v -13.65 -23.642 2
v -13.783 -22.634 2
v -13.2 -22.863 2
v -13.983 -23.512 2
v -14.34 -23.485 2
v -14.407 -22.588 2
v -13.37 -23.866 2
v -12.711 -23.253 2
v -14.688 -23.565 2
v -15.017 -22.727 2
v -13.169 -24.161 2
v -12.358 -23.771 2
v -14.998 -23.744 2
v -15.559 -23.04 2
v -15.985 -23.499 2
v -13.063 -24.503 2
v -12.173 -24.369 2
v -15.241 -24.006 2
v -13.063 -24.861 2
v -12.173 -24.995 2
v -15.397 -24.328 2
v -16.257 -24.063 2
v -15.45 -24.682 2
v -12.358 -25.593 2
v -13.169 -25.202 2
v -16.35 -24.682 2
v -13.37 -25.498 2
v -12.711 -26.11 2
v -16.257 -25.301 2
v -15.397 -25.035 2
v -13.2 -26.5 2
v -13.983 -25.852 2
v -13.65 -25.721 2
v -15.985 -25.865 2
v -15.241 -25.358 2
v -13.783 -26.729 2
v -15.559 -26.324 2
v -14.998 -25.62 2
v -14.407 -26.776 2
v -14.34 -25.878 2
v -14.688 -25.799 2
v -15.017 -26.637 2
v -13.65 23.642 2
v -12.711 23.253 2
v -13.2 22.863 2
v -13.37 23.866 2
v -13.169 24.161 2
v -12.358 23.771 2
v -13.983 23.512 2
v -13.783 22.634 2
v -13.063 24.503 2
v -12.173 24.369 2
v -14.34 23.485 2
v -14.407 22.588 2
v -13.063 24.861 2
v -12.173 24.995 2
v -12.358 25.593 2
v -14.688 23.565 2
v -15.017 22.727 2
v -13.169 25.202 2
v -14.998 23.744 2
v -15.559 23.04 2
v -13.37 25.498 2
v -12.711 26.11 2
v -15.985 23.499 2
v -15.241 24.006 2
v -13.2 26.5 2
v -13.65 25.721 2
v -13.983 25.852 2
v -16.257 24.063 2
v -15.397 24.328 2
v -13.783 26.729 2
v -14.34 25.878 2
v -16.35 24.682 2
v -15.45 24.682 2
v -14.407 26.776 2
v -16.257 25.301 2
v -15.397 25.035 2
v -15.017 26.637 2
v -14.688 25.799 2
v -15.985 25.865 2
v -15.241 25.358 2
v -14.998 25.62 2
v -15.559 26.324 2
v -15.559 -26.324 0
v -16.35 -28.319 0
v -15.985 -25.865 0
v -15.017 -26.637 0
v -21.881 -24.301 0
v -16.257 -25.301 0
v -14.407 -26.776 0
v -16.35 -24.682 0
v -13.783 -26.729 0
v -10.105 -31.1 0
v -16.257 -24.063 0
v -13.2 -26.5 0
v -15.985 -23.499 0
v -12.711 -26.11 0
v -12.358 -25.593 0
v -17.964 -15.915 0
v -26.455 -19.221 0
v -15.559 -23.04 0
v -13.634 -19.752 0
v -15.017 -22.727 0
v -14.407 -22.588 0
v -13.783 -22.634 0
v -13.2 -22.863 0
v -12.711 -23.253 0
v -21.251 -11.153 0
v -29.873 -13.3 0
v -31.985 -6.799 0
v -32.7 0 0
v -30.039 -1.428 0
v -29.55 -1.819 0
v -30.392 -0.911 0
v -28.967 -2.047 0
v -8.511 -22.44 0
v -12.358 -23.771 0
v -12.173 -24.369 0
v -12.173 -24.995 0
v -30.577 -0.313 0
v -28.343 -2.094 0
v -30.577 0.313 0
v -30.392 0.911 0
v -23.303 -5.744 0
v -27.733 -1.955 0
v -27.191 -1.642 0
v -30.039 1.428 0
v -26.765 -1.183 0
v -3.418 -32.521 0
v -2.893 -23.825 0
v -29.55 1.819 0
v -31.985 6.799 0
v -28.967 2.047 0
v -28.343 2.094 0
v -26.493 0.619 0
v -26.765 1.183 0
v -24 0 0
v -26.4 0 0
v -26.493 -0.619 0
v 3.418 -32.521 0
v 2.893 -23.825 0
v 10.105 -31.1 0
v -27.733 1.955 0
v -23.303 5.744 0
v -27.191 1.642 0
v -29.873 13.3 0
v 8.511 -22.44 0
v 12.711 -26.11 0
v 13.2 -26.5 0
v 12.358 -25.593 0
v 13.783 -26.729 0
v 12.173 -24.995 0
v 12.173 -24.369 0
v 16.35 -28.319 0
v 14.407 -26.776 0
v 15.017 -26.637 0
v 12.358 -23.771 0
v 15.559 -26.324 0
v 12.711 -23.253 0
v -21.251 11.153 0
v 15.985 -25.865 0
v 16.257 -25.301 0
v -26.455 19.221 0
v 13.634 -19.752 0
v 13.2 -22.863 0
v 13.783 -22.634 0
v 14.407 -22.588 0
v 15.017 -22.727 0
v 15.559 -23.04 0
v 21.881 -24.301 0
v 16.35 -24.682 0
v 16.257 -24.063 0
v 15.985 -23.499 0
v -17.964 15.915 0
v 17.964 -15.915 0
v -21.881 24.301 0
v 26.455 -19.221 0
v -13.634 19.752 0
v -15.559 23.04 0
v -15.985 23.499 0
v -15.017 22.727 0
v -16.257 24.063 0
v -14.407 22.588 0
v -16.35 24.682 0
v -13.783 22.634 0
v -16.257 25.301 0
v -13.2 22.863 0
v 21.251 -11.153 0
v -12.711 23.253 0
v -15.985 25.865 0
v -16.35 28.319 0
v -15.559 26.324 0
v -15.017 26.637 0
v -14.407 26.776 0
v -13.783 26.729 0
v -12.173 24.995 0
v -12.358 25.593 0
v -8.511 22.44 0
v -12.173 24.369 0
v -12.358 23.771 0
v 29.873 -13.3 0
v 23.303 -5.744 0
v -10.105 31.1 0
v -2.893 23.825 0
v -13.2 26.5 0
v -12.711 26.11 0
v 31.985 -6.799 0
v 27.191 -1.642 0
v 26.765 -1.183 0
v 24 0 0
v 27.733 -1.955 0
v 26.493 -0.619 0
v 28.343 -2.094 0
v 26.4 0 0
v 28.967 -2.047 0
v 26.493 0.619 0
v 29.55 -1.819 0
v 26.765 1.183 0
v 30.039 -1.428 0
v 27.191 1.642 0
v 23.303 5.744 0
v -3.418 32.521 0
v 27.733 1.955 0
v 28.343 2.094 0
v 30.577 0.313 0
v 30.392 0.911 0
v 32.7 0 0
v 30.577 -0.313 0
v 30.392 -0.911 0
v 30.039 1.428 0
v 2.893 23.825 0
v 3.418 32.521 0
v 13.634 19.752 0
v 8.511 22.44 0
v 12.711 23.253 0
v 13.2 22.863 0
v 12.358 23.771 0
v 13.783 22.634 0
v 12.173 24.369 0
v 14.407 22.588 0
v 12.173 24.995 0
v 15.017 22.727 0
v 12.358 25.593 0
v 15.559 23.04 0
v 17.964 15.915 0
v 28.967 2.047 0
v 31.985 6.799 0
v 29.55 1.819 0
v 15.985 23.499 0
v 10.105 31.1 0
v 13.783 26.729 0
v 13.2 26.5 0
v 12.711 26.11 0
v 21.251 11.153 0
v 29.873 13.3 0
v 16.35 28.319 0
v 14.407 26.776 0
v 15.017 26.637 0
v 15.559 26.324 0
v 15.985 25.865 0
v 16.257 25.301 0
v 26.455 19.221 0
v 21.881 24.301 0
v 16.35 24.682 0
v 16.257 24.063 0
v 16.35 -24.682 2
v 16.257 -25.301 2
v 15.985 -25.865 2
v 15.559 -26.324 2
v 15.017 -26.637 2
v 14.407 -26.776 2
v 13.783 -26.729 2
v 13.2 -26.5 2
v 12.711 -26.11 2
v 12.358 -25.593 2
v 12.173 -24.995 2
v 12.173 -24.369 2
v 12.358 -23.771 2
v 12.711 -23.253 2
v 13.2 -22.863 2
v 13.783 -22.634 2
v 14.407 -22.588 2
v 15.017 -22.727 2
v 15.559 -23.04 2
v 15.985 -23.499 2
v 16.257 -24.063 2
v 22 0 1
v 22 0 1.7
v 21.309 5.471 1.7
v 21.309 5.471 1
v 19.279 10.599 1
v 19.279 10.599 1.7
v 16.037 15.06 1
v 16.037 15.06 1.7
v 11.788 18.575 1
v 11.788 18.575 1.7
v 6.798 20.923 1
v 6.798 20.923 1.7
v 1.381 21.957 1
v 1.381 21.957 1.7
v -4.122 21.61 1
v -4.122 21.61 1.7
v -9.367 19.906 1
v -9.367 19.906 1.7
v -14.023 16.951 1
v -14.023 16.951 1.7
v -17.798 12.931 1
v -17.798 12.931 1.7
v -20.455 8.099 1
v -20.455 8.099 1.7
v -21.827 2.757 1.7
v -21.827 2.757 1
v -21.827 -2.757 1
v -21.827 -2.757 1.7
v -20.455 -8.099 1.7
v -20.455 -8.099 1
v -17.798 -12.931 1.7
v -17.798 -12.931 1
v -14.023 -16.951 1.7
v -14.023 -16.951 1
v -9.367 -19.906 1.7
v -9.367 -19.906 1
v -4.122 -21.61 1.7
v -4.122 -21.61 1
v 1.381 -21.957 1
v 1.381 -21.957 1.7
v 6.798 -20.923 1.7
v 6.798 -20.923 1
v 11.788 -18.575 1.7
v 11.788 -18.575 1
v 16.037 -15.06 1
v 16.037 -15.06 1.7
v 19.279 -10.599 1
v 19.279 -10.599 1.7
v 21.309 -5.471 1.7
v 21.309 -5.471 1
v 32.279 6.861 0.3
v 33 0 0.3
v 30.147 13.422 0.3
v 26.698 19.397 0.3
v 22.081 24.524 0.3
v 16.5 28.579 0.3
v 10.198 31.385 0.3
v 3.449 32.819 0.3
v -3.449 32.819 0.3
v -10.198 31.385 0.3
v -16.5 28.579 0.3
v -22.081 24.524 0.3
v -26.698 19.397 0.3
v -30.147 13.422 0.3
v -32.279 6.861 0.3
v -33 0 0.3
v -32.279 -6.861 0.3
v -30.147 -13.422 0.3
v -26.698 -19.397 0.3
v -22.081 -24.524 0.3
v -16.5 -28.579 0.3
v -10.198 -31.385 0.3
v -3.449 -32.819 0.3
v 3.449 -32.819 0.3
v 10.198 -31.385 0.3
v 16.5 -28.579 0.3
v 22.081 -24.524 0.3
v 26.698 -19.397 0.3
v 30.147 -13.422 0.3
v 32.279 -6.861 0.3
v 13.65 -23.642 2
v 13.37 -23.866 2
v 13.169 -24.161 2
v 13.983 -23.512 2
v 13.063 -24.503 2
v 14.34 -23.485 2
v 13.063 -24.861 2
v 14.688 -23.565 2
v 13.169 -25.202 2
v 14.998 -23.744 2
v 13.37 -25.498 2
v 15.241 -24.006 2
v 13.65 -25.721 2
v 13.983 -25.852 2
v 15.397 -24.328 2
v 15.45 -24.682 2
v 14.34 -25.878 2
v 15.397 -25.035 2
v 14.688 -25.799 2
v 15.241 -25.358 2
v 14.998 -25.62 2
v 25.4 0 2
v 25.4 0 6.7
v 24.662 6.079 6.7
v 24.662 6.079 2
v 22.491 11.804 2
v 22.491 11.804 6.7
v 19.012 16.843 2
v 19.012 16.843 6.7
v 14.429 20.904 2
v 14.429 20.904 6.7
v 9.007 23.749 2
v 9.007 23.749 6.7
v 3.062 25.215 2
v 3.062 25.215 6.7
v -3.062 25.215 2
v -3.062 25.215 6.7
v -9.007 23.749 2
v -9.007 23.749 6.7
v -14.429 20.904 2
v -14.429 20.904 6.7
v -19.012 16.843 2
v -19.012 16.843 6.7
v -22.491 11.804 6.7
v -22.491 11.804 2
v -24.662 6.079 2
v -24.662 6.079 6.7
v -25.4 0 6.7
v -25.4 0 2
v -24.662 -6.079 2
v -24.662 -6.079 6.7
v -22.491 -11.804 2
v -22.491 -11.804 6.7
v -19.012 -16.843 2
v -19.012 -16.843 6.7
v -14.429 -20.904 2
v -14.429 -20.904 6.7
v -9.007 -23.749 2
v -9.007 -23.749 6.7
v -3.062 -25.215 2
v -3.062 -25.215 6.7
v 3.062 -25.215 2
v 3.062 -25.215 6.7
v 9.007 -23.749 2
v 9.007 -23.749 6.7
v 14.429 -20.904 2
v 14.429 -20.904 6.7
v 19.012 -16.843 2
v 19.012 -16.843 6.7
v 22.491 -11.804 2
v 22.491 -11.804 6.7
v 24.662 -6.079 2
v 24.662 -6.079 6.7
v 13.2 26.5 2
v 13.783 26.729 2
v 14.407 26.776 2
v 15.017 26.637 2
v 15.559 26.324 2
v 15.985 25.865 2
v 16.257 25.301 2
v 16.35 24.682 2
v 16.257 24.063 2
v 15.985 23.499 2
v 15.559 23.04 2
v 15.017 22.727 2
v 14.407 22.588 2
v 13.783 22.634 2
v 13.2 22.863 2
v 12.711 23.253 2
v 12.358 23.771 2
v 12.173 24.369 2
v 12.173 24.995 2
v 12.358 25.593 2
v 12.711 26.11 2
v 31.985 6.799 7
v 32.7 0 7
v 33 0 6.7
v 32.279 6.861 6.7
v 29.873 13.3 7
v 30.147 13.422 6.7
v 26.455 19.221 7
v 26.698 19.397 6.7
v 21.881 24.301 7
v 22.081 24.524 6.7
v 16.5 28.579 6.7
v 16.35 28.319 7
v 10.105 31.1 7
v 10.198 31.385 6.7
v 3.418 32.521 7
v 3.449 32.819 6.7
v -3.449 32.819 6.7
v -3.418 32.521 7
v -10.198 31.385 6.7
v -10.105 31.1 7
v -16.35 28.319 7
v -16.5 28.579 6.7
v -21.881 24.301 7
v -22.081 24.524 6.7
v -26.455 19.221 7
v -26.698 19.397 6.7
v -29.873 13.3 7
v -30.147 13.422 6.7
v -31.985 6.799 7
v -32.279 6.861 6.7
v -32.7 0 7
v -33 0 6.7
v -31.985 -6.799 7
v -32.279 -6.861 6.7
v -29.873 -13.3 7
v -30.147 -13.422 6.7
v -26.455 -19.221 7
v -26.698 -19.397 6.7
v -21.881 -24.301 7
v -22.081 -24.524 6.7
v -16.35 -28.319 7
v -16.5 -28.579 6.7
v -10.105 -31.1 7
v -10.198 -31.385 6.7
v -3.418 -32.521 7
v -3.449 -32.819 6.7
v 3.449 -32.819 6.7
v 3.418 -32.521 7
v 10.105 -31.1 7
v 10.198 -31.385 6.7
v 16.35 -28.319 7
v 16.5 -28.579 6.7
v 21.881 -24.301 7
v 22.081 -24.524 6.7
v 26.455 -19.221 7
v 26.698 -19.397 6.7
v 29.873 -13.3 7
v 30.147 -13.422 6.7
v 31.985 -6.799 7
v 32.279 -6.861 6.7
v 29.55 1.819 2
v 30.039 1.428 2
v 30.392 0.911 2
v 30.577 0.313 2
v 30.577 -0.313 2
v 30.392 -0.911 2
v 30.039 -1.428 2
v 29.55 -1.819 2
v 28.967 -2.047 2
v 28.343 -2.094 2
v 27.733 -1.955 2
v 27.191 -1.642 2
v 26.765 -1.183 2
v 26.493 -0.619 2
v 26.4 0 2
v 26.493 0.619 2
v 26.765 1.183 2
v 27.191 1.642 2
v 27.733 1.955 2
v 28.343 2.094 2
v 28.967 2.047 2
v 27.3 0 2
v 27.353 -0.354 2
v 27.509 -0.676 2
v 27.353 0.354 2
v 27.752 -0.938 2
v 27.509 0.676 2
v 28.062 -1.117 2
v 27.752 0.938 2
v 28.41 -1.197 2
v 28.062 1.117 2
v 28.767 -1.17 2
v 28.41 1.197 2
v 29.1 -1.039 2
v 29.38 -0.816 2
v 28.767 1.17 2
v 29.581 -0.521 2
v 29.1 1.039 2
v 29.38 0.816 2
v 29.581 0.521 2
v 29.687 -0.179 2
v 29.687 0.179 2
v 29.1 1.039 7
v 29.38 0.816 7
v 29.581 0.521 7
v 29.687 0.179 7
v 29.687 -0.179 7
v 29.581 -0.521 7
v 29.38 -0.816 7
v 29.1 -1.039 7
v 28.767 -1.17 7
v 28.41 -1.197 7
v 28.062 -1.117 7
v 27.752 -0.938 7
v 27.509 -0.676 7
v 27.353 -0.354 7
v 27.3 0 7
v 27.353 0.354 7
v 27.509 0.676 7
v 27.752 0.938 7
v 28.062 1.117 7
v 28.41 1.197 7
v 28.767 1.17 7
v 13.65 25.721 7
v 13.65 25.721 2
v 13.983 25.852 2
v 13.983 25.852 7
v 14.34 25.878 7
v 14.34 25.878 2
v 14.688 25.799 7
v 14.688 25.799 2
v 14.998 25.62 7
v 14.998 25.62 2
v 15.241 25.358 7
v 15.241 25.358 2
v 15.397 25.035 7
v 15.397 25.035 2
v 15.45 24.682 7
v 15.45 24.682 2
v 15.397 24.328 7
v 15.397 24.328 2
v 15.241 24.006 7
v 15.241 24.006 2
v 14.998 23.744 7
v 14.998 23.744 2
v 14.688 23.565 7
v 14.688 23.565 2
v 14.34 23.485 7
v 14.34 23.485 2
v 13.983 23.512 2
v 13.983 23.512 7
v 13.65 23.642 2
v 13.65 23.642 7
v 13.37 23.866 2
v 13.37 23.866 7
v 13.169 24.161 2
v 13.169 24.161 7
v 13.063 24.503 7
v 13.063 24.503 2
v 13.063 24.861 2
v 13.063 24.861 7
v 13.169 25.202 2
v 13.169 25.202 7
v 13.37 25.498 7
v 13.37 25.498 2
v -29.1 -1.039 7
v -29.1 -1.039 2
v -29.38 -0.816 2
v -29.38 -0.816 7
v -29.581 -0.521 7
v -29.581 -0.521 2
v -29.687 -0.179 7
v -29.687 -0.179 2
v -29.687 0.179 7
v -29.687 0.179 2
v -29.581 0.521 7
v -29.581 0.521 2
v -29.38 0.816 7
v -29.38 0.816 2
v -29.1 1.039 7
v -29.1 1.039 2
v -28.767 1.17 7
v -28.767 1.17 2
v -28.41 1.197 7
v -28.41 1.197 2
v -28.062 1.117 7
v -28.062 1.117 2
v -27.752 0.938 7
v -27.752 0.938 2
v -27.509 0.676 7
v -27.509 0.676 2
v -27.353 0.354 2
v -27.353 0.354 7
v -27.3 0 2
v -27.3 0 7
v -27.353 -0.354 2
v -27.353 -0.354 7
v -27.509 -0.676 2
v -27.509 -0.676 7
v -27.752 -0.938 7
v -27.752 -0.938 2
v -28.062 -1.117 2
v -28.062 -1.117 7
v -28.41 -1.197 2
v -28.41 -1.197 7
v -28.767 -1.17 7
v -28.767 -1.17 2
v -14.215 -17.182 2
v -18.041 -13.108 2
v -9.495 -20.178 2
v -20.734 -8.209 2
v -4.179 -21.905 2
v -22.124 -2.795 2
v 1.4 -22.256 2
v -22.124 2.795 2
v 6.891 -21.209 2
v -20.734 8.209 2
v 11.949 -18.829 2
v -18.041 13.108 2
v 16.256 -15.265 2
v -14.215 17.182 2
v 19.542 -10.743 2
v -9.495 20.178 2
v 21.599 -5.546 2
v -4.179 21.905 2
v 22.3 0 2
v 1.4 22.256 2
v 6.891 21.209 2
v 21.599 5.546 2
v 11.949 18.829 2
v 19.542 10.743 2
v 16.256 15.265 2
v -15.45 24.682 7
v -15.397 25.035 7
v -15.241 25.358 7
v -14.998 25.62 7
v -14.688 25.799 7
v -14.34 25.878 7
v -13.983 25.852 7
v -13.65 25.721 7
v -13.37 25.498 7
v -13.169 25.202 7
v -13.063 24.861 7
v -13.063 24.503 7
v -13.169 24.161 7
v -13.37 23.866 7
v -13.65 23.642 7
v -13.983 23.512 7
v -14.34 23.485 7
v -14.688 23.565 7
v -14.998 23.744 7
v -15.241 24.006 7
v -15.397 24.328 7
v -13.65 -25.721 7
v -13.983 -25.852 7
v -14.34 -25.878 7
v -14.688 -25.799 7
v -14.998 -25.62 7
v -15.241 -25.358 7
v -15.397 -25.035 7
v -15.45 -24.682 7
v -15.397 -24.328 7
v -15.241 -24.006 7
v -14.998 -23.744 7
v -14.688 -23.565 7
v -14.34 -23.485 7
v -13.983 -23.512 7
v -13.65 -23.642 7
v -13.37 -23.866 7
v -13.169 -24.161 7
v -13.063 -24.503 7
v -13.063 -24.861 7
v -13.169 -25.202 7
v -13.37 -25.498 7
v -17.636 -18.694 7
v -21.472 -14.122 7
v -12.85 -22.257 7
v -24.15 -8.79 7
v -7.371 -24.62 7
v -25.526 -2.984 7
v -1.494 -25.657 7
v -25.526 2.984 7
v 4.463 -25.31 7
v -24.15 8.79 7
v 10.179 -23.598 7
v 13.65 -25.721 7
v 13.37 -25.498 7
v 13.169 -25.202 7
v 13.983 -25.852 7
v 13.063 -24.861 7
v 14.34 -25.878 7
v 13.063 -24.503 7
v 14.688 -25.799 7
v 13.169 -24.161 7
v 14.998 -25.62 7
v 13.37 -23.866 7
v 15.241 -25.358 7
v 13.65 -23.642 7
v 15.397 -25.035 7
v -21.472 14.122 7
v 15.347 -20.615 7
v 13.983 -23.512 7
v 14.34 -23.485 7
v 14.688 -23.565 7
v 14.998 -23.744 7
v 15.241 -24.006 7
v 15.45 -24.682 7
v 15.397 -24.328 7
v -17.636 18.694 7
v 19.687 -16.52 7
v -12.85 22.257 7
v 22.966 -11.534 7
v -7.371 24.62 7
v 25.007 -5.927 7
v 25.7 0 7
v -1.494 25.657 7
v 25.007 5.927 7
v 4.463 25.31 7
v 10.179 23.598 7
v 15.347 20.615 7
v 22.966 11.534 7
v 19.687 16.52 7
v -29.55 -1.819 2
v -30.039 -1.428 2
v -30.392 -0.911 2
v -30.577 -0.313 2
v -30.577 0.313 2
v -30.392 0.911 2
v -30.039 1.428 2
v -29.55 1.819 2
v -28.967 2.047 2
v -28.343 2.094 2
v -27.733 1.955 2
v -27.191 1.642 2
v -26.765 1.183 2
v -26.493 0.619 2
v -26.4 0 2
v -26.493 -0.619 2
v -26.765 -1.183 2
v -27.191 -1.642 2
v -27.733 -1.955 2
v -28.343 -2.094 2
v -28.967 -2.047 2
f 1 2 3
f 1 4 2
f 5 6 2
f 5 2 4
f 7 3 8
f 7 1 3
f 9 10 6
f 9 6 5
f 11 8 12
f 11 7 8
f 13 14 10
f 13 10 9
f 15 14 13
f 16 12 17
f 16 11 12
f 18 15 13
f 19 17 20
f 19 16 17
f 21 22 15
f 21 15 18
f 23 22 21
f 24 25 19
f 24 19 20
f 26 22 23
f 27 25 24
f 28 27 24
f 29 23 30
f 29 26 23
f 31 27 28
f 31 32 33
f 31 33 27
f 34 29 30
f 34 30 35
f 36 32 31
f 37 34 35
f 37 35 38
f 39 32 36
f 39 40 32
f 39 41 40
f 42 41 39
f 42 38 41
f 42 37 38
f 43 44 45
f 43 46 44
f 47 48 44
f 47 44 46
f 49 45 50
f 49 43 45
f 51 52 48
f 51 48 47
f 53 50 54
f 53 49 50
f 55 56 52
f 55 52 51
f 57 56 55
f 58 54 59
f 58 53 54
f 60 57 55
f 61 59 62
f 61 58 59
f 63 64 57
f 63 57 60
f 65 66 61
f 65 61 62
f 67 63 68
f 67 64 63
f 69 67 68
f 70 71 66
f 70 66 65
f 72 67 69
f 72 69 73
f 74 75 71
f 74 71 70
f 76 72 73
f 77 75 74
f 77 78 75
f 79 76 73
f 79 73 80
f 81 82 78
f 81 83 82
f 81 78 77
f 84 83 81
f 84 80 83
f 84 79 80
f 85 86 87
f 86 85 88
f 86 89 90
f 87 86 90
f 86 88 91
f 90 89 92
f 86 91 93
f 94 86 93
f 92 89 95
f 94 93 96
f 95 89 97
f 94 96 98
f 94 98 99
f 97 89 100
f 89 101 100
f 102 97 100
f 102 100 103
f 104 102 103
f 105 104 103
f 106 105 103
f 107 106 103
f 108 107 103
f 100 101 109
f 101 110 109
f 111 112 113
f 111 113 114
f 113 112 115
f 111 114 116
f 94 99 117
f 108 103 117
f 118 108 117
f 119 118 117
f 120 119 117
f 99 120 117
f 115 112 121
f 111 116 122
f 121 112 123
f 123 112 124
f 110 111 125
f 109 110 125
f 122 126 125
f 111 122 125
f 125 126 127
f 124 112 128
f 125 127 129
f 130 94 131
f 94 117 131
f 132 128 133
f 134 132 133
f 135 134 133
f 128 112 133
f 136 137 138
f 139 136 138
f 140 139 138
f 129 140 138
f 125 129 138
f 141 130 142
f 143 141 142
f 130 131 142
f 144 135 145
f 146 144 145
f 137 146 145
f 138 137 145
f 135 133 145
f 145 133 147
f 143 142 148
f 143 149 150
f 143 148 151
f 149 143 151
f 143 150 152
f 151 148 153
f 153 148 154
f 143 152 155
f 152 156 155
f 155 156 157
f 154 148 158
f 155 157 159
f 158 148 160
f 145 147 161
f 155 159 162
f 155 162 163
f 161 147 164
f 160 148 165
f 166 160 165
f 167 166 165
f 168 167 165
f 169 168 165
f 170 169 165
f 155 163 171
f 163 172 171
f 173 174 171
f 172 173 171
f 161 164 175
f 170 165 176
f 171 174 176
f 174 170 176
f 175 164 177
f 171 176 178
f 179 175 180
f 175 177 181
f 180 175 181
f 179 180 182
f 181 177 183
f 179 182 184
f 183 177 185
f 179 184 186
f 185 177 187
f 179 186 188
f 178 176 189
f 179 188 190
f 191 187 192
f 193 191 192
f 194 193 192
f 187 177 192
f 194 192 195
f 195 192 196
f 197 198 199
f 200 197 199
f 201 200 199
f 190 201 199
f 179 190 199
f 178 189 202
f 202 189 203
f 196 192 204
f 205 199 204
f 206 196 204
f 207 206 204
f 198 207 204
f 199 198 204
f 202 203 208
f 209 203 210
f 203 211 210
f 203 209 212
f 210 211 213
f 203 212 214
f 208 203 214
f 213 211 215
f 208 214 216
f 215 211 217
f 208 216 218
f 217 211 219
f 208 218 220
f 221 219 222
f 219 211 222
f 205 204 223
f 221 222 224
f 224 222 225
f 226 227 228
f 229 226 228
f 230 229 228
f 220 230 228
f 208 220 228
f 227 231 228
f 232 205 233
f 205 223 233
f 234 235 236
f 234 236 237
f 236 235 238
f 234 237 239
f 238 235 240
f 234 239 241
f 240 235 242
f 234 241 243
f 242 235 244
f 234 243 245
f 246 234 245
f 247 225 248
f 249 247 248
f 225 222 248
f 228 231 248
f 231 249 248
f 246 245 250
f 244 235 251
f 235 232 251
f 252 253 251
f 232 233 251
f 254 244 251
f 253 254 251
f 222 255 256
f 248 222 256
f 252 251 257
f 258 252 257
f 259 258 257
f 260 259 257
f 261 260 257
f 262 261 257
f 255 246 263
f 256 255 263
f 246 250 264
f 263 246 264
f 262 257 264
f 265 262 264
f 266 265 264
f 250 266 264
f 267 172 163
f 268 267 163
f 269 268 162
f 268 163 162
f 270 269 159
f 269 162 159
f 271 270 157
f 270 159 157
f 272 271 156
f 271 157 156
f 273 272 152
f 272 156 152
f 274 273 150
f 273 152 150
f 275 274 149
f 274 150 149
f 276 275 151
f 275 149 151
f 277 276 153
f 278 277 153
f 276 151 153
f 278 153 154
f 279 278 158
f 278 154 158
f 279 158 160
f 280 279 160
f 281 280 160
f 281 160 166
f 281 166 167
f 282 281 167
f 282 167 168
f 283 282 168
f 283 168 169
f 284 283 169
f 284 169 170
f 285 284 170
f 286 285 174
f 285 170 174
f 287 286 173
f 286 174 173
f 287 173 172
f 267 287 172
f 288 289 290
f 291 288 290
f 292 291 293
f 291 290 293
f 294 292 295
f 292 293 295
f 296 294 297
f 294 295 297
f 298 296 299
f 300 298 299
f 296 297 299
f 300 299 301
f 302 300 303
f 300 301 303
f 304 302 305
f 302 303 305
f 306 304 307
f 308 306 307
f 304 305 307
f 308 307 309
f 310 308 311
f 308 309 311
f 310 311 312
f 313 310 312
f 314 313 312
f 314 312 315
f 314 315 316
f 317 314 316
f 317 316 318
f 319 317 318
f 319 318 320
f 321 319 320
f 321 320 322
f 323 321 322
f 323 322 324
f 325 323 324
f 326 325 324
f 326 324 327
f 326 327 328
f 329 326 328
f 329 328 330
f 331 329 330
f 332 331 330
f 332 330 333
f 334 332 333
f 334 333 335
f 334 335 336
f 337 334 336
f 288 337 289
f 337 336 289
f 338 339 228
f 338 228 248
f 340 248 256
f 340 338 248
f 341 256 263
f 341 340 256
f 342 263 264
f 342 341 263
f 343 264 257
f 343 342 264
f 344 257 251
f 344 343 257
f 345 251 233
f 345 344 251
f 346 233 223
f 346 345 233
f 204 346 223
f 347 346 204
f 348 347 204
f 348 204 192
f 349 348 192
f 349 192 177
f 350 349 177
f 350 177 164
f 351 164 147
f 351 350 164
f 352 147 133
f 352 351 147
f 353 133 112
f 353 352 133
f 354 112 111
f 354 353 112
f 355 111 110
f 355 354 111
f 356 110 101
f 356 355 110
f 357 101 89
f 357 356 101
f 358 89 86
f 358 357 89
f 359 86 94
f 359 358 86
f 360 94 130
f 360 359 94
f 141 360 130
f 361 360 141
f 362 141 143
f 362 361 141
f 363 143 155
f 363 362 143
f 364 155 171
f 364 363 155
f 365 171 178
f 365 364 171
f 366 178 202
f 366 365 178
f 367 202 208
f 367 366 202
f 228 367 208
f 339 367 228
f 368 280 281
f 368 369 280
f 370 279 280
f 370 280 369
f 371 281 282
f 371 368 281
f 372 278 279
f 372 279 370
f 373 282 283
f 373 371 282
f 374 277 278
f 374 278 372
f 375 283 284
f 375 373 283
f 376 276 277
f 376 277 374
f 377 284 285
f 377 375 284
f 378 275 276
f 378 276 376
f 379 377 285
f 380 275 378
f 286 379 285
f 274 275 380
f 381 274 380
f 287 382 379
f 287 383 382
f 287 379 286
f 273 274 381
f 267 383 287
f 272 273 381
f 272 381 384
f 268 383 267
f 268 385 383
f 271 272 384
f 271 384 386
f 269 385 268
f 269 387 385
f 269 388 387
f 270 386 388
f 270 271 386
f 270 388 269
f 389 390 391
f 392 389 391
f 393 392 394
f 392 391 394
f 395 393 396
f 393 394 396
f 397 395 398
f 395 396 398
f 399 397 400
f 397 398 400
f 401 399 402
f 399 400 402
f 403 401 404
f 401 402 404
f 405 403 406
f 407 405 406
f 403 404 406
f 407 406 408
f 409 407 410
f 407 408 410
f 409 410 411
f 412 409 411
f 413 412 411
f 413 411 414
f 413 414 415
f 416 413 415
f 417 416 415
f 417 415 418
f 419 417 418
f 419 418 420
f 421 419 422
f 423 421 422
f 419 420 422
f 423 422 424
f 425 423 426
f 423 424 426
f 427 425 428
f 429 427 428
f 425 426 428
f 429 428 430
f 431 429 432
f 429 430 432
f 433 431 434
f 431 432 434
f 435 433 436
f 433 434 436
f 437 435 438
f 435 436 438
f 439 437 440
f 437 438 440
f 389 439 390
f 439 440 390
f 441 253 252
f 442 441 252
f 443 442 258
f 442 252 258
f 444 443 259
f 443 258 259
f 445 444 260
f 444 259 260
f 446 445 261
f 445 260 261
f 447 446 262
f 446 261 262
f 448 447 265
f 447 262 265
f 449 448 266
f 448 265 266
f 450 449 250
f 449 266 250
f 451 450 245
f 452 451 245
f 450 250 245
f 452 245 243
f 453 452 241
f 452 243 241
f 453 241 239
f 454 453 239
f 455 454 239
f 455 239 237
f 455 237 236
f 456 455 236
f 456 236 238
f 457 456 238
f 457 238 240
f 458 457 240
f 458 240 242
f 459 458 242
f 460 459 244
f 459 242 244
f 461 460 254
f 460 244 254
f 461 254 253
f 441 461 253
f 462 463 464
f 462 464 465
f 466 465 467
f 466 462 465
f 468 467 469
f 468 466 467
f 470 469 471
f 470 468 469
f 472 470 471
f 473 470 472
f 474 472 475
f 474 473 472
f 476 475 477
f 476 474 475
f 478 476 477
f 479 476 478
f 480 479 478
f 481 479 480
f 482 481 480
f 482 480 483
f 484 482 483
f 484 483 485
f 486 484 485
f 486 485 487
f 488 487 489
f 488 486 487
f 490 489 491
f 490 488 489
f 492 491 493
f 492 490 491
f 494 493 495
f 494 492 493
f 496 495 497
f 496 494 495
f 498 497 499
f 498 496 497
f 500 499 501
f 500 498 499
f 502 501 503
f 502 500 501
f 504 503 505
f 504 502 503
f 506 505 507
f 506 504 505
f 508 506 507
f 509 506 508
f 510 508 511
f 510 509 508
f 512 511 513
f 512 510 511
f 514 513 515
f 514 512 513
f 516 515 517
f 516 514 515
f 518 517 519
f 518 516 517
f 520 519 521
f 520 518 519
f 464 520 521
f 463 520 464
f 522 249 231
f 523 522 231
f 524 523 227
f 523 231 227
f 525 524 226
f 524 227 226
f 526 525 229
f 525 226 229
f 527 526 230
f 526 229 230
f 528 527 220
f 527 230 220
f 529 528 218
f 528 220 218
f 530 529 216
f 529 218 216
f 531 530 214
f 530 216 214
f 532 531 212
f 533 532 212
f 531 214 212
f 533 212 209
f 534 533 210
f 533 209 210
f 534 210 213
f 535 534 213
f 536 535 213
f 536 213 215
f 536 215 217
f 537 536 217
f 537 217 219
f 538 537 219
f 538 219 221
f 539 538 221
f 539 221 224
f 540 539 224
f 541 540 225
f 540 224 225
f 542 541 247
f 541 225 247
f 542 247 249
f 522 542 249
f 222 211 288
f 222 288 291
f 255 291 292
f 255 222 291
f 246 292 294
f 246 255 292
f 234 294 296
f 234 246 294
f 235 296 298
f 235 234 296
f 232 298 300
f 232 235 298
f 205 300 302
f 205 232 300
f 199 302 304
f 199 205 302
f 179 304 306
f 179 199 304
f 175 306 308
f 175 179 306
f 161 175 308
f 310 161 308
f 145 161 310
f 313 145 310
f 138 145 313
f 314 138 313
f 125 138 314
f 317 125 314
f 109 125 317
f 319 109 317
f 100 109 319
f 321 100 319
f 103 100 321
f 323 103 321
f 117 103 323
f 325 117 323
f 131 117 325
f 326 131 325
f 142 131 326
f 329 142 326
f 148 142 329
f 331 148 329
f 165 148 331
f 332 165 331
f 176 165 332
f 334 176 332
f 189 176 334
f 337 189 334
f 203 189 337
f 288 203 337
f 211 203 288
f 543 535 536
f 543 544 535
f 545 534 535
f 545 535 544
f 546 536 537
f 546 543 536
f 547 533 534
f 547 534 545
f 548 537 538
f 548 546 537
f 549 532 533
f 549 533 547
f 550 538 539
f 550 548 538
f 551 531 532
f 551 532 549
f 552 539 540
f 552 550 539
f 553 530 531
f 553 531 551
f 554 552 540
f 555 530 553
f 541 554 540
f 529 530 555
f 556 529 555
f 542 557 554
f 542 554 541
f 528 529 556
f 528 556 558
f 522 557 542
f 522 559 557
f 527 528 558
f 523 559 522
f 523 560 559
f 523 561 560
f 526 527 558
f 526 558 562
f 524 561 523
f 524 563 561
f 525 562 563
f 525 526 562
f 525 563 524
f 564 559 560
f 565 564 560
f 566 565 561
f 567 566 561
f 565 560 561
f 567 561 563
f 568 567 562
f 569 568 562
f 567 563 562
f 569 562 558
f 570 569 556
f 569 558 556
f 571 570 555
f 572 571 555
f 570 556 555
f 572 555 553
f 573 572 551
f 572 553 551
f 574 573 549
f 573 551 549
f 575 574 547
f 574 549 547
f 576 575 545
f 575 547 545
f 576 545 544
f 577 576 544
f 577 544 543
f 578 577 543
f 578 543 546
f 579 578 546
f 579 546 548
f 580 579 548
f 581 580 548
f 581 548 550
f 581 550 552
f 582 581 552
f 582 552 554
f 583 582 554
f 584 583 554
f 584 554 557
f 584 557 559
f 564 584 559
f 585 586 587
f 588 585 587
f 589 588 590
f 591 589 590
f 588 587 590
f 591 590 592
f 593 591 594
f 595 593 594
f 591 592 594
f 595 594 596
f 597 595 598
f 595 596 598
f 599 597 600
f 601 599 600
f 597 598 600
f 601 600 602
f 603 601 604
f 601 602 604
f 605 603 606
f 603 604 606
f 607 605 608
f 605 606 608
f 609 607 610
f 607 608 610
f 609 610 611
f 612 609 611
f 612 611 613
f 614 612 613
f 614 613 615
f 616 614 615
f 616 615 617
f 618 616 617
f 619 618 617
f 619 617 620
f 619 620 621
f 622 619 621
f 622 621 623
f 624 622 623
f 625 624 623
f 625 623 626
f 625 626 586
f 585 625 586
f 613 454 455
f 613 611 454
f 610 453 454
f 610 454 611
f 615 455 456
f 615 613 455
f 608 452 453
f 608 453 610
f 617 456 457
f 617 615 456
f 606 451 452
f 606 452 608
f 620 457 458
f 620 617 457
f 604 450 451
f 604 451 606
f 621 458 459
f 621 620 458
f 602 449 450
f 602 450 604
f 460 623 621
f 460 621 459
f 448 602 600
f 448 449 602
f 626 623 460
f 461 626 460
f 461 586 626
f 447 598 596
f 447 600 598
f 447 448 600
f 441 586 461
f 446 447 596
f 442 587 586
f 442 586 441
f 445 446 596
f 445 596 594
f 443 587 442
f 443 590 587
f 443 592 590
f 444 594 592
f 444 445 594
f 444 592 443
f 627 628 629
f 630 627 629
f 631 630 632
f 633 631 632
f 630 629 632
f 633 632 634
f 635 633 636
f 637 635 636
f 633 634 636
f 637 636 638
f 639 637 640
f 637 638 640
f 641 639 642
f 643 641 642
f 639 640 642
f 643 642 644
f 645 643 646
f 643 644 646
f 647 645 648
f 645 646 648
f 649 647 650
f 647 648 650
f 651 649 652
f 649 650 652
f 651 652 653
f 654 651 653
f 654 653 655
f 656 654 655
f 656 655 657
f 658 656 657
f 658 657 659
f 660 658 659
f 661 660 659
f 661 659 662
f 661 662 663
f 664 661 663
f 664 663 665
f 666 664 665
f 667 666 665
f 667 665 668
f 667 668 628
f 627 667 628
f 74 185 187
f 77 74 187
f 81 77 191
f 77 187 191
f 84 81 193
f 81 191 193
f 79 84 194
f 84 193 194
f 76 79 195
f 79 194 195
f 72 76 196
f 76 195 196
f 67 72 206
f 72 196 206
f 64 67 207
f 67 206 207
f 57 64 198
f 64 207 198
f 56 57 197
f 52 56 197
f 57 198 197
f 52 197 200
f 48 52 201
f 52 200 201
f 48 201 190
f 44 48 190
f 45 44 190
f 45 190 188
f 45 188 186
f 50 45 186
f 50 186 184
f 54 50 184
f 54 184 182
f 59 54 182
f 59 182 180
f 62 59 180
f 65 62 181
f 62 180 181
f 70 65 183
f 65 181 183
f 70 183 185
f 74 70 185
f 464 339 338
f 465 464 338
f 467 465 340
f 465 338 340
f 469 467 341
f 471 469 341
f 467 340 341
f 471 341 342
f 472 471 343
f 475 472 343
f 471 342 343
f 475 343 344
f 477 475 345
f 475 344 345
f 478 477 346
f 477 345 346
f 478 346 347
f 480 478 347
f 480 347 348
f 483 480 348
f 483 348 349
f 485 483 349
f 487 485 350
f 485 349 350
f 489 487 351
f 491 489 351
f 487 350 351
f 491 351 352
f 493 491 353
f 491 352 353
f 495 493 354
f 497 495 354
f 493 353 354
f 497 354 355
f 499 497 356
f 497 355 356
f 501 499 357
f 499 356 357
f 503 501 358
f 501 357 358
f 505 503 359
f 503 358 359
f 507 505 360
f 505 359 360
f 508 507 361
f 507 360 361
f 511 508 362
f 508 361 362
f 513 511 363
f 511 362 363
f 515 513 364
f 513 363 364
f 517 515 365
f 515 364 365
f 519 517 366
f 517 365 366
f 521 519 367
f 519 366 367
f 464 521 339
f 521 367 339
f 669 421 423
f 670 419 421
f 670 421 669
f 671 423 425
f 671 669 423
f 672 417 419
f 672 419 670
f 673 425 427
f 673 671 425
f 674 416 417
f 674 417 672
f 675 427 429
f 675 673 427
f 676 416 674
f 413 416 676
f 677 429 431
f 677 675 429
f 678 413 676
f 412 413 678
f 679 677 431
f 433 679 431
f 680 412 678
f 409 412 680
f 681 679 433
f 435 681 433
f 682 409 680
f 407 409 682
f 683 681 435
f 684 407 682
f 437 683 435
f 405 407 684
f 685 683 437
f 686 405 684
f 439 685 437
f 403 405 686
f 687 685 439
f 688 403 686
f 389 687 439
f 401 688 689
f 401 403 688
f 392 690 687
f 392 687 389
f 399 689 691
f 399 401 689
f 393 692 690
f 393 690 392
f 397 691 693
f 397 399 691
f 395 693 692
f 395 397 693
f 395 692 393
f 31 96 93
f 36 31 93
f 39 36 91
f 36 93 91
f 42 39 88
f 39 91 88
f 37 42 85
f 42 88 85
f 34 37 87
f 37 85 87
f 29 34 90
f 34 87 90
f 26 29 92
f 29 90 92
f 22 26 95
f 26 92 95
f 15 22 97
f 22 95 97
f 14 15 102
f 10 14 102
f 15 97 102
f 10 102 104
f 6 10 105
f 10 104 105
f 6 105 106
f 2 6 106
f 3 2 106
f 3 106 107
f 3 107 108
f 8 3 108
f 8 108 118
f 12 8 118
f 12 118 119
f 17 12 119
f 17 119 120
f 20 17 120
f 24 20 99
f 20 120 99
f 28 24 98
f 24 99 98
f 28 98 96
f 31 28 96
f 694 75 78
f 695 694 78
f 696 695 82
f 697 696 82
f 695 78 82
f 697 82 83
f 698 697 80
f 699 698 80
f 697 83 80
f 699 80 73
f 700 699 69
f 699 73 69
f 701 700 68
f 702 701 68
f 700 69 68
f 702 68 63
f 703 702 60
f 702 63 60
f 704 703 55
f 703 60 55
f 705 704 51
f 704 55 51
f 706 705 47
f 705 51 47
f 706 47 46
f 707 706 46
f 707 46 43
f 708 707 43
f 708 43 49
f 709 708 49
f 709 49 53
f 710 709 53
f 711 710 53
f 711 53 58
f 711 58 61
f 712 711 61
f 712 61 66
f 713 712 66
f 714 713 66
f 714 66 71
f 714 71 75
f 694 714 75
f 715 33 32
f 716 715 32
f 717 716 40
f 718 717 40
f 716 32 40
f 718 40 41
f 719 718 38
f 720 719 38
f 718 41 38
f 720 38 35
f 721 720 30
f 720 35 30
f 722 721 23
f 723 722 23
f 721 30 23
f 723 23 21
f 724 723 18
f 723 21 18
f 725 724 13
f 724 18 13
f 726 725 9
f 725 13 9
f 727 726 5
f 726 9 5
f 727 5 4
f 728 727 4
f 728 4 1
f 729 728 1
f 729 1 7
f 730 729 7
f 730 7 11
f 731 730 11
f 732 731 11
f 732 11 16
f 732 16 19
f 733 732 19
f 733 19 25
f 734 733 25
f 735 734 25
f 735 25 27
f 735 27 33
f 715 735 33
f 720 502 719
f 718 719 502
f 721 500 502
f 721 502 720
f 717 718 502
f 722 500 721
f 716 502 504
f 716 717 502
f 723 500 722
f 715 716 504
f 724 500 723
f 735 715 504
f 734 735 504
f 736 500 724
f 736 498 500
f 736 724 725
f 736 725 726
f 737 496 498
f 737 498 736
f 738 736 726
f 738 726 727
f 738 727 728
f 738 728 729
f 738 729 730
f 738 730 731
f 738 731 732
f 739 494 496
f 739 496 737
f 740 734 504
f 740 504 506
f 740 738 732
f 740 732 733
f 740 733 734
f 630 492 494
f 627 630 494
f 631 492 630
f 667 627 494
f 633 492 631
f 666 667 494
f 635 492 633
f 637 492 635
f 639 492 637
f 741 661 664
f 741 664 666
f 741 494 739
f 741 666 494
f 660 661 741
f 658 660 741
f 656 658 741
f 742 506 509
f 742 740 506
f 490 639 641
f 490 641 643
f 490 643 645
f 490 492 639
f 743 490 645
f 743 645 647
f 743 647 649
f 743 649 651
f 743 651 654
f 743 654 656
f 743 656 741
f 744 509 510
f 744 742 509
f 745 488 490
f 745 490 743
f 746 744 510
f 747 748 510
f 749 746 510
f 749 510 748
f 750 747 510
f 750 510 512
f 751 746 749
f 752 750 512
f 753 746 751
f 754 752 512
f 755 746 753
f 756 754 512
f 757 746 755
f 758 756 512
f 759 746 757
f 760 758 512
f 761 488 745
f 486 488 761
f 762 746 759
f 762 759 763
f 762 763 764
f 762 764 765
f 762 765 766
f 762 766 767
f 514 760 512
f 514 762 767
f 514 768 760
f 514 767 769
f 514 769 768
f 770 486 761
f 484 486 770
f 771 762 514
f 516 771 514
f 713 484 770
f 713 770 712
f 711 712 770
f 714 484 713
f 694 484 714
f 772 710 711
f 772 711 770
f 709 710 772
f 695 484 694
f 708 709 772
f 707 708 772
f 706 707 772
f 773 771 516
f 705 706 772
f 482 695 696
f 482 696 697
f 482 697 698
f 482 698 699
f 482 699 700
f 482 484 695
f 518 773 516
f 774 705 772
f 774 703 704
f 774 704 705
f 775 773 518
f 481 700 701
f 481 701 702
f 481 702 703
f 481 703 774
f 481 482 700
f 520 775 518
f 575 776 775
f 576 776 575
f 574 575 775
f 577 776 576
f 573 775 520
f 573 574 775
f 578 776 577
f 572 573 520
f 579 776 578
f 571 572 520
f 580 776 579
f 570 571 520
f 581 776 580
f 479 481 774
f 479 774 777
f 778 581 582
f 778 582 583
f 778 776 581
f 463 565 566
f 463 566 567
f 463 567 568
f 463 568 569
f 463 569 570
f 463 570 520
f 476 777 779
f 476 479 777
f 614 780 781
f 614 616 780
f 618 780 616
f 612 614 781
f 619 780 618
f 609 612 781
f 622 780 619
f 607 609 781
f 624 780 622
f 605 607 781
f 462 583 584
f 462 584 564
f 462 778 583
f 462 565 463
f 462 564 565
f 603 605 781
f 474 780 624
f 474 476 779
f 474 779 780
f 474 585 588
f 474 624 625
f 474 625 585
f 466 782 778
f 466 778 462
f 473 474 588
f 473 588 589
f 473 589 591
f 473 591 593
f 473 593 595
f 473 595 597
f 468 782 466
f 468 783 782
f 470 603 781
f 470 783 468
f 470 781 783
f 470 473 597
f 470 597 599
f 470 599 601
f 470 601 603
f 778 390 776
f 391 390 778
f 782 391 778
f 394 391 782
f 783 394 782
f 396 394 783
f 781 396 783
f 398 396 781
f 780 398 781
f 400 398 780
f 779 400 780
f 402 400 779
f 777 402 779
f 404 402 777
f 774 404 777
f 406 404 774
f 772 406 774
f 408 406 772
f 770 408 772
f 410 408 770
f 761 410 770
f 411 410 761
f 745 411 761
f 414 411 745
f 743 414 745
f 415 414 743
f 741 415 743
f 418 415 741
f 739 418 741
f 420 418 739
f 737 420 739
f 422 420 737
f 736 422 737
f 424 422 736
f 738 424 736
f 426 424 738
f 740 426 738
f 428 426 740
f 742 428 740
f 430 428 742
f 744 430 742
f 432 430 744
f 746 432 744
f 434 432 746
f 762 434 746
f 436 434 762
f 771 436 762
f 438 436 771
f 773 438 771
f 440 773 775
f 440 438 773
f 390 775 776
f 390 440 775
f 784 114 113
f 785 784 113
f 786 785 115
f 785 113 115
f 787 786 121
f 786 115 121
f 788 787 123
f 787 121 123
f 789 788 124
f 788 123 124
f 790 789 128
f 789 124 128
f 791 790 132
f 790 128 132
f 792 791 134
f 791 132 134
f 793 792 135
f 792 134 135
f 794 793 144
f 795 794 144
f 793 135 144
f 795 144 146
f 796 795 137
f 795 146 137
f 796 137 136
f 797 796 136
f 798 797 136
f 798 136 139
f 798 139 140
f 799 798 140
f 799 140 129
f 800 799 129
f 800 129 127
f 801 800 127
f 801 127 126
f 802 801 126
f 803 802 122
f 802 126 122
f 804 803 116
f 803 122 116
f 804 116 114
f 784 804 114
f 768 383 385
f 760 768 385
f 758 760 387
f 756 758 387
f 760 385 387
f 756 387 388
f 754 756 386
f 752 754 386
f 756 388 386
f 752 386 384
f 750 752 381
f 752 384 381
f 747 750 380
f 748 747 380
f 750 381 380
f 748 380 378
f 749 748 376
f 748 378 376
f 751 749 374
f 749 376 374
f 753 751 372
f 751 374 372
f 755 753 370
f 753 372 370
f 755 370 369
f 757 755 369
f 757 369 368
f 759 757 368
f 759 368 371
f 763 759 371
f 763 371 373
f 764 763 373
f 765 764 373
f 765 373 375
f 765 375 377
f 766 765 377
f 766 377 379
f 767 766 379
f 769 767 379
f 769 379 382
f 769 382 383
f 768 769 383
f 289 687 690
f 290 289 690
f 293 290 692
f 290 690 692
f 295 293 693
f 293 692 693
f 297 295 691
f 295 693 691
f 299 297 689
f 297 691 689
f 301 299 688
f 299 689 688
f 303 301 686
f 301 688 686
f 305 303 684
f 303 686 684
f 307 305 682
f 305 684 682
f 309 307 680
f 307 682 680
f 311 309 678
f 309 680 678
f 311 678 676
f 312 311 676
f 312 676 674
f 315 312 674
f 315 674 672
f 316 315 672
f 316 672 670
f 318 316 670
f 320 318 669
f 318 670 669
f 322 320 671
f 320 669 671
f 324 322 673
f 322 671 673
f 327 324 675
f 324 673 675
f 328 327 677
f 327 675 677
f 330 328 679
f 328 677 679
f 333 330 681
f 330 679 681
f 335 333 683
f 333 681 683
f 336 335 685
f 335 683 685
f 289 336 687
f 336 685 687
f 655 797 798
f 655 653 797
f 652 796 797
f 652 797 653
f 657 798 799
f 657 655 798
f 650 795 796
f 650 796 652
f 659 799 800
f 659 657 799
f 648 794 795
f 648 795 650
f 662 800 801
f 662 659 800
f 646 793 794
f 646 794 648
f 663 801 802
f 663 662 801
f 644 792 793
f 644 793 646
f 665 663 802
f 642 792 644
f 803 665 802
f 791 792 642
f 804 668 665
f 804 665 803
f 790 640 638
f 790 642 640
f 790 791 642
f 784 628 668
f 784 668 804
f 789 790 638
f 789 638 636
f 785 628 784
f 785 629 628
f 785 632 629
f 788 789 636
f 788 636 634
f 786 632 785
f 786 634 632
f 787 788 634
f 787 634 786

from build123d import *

# Parameters (mm, degrees)
SKETCH1_R                    = 33
MAIN_BODY_DEPTH              = 7
SKETCH2_R                    = 22
OPTICAL_CUTOUT_DEPTH         = 48.191100856
SKETCH3_R                    = 25.4
WINDOW_CUTOUT_DEPTH          = 5
SKETCH4_R                    = 1.2
CUT_EXTRUDE3_DEPTH           = 48.191100856
SKETCH5_R                    = 2.1
CUT_EXTRUDE4_DEPTH           = 2
CIRCULAR_PATTERN_COUNT       = 6
BUBBLE_CONTROL_CHAMFER_SIZE  = 1
BUBBLE_CONTROL_CHAMFER_SIZE2 = 2
CHAMFER1_SIZE                = 0.3


with BuildPart() as part:
    # Sketch1 → Main Body (new body)
    with BuildSketch(Plane.XY):
        Circle(SKETCH1_R)
    extrude(amount=MAIN_BODY_DEPTH)

    # Sketch2 → Optical Cutout (cut, through all)
    with BuildSketch(Plane.XY.offset(7)):
        Circle(SKETCH2_R)
    extrude(amount=-OPTICAL_CUTOUT_DEPTH, mode=Mode.SUBTRACT)

    # Sketch3 → Window Cutout (cut)
    with BuildSketch(Plane.XY.offset(7)):
        Circle(SKETCH3_R)
    extrude(amount=-WINDOW_CUTOUT_DEPTH, mode=Mode.SUBTRACT)

    # Sketch4 → Cut-Extrude3 (cut, through all)
    with BuildSketch(Plane(origin=(0, 0, 0), x_dir=(-1, 0, 0), z_dir=(0, 0, -1))):
        with Locations((14.25, 24.681724008)):
            Circle(SKETCH4_R)
    cut_extrude3 = extrude(amount=-CUT_EXTRUDE3_DEPTH, mode=Mode.SUBTRACT)

    # Sketch5 → Cut-Extrude4 (cut)
    with BuildSketch(Plane(origin=(0, 0, 0), x_dir=(-1, 0, 0), z_dir=(0, 0, -1))):
        with Locations((14.25, 24.681724008)):
            Circle(SKETCH5_R)
    cut_extrude4 = extrude(amount=-CUT_EXTRUDE4_DEPTH, mode=Mode.SUBTRACT)

    # Circular Pattern: Cut-Extrude3, Cut-Extrude4 ×6 about axis
    circular_pattern_axis = Axis((0, 0, 7), (0, 0, -1))
    add([cut_extrude3.rotate(circular_pattern_axis, i * 360 / CIRCULAR_PATTERN_COUNT) for i in range(1, CIRCULAR_PATTERN_COUNT)], mode=Mode.SUBTRACT)
    add([cut_extrude4.rotate(circular_pattern_axis, i * 360 / CIRCULAR_PATTERN_COUNT) for i in range(1, CIRCULAR_PATTERN_COUNT)], mode=Mode.SUBTRACT)

    # Bubble Control Chamfer
    bubble_control_chamfer_edges = [part.edges().sort_by_distance(p)[0] for p in [
        (-22, 0, 0),
    ]]
    bubble_control_chamfer_side = [part.faces().sort_by_distance(p)[0] for p in [
        (-22, 0, 1),
    ]]
    chamfer(bubble_control_chamfer_edges, length=BUBBLE_CONTROL_CHAMFER_SIZE, length2=BUBBLE_CONTROL_CHAMFER_SIZE2, reference=bubble_control_chamfer_side[0])

    # Chamfer1
    chamfer1_edges = [part.edges().sort_by_distance(p)[0] for p in [
        (-33, 0, 0),
        (-33, 0, 7),
        (-25.4, 0, 7),
        (-22, 0, 2),
    ]]
    chamfer(chamfer1_edges, length=CHAMFER1_SIZE)


solid = part.part
